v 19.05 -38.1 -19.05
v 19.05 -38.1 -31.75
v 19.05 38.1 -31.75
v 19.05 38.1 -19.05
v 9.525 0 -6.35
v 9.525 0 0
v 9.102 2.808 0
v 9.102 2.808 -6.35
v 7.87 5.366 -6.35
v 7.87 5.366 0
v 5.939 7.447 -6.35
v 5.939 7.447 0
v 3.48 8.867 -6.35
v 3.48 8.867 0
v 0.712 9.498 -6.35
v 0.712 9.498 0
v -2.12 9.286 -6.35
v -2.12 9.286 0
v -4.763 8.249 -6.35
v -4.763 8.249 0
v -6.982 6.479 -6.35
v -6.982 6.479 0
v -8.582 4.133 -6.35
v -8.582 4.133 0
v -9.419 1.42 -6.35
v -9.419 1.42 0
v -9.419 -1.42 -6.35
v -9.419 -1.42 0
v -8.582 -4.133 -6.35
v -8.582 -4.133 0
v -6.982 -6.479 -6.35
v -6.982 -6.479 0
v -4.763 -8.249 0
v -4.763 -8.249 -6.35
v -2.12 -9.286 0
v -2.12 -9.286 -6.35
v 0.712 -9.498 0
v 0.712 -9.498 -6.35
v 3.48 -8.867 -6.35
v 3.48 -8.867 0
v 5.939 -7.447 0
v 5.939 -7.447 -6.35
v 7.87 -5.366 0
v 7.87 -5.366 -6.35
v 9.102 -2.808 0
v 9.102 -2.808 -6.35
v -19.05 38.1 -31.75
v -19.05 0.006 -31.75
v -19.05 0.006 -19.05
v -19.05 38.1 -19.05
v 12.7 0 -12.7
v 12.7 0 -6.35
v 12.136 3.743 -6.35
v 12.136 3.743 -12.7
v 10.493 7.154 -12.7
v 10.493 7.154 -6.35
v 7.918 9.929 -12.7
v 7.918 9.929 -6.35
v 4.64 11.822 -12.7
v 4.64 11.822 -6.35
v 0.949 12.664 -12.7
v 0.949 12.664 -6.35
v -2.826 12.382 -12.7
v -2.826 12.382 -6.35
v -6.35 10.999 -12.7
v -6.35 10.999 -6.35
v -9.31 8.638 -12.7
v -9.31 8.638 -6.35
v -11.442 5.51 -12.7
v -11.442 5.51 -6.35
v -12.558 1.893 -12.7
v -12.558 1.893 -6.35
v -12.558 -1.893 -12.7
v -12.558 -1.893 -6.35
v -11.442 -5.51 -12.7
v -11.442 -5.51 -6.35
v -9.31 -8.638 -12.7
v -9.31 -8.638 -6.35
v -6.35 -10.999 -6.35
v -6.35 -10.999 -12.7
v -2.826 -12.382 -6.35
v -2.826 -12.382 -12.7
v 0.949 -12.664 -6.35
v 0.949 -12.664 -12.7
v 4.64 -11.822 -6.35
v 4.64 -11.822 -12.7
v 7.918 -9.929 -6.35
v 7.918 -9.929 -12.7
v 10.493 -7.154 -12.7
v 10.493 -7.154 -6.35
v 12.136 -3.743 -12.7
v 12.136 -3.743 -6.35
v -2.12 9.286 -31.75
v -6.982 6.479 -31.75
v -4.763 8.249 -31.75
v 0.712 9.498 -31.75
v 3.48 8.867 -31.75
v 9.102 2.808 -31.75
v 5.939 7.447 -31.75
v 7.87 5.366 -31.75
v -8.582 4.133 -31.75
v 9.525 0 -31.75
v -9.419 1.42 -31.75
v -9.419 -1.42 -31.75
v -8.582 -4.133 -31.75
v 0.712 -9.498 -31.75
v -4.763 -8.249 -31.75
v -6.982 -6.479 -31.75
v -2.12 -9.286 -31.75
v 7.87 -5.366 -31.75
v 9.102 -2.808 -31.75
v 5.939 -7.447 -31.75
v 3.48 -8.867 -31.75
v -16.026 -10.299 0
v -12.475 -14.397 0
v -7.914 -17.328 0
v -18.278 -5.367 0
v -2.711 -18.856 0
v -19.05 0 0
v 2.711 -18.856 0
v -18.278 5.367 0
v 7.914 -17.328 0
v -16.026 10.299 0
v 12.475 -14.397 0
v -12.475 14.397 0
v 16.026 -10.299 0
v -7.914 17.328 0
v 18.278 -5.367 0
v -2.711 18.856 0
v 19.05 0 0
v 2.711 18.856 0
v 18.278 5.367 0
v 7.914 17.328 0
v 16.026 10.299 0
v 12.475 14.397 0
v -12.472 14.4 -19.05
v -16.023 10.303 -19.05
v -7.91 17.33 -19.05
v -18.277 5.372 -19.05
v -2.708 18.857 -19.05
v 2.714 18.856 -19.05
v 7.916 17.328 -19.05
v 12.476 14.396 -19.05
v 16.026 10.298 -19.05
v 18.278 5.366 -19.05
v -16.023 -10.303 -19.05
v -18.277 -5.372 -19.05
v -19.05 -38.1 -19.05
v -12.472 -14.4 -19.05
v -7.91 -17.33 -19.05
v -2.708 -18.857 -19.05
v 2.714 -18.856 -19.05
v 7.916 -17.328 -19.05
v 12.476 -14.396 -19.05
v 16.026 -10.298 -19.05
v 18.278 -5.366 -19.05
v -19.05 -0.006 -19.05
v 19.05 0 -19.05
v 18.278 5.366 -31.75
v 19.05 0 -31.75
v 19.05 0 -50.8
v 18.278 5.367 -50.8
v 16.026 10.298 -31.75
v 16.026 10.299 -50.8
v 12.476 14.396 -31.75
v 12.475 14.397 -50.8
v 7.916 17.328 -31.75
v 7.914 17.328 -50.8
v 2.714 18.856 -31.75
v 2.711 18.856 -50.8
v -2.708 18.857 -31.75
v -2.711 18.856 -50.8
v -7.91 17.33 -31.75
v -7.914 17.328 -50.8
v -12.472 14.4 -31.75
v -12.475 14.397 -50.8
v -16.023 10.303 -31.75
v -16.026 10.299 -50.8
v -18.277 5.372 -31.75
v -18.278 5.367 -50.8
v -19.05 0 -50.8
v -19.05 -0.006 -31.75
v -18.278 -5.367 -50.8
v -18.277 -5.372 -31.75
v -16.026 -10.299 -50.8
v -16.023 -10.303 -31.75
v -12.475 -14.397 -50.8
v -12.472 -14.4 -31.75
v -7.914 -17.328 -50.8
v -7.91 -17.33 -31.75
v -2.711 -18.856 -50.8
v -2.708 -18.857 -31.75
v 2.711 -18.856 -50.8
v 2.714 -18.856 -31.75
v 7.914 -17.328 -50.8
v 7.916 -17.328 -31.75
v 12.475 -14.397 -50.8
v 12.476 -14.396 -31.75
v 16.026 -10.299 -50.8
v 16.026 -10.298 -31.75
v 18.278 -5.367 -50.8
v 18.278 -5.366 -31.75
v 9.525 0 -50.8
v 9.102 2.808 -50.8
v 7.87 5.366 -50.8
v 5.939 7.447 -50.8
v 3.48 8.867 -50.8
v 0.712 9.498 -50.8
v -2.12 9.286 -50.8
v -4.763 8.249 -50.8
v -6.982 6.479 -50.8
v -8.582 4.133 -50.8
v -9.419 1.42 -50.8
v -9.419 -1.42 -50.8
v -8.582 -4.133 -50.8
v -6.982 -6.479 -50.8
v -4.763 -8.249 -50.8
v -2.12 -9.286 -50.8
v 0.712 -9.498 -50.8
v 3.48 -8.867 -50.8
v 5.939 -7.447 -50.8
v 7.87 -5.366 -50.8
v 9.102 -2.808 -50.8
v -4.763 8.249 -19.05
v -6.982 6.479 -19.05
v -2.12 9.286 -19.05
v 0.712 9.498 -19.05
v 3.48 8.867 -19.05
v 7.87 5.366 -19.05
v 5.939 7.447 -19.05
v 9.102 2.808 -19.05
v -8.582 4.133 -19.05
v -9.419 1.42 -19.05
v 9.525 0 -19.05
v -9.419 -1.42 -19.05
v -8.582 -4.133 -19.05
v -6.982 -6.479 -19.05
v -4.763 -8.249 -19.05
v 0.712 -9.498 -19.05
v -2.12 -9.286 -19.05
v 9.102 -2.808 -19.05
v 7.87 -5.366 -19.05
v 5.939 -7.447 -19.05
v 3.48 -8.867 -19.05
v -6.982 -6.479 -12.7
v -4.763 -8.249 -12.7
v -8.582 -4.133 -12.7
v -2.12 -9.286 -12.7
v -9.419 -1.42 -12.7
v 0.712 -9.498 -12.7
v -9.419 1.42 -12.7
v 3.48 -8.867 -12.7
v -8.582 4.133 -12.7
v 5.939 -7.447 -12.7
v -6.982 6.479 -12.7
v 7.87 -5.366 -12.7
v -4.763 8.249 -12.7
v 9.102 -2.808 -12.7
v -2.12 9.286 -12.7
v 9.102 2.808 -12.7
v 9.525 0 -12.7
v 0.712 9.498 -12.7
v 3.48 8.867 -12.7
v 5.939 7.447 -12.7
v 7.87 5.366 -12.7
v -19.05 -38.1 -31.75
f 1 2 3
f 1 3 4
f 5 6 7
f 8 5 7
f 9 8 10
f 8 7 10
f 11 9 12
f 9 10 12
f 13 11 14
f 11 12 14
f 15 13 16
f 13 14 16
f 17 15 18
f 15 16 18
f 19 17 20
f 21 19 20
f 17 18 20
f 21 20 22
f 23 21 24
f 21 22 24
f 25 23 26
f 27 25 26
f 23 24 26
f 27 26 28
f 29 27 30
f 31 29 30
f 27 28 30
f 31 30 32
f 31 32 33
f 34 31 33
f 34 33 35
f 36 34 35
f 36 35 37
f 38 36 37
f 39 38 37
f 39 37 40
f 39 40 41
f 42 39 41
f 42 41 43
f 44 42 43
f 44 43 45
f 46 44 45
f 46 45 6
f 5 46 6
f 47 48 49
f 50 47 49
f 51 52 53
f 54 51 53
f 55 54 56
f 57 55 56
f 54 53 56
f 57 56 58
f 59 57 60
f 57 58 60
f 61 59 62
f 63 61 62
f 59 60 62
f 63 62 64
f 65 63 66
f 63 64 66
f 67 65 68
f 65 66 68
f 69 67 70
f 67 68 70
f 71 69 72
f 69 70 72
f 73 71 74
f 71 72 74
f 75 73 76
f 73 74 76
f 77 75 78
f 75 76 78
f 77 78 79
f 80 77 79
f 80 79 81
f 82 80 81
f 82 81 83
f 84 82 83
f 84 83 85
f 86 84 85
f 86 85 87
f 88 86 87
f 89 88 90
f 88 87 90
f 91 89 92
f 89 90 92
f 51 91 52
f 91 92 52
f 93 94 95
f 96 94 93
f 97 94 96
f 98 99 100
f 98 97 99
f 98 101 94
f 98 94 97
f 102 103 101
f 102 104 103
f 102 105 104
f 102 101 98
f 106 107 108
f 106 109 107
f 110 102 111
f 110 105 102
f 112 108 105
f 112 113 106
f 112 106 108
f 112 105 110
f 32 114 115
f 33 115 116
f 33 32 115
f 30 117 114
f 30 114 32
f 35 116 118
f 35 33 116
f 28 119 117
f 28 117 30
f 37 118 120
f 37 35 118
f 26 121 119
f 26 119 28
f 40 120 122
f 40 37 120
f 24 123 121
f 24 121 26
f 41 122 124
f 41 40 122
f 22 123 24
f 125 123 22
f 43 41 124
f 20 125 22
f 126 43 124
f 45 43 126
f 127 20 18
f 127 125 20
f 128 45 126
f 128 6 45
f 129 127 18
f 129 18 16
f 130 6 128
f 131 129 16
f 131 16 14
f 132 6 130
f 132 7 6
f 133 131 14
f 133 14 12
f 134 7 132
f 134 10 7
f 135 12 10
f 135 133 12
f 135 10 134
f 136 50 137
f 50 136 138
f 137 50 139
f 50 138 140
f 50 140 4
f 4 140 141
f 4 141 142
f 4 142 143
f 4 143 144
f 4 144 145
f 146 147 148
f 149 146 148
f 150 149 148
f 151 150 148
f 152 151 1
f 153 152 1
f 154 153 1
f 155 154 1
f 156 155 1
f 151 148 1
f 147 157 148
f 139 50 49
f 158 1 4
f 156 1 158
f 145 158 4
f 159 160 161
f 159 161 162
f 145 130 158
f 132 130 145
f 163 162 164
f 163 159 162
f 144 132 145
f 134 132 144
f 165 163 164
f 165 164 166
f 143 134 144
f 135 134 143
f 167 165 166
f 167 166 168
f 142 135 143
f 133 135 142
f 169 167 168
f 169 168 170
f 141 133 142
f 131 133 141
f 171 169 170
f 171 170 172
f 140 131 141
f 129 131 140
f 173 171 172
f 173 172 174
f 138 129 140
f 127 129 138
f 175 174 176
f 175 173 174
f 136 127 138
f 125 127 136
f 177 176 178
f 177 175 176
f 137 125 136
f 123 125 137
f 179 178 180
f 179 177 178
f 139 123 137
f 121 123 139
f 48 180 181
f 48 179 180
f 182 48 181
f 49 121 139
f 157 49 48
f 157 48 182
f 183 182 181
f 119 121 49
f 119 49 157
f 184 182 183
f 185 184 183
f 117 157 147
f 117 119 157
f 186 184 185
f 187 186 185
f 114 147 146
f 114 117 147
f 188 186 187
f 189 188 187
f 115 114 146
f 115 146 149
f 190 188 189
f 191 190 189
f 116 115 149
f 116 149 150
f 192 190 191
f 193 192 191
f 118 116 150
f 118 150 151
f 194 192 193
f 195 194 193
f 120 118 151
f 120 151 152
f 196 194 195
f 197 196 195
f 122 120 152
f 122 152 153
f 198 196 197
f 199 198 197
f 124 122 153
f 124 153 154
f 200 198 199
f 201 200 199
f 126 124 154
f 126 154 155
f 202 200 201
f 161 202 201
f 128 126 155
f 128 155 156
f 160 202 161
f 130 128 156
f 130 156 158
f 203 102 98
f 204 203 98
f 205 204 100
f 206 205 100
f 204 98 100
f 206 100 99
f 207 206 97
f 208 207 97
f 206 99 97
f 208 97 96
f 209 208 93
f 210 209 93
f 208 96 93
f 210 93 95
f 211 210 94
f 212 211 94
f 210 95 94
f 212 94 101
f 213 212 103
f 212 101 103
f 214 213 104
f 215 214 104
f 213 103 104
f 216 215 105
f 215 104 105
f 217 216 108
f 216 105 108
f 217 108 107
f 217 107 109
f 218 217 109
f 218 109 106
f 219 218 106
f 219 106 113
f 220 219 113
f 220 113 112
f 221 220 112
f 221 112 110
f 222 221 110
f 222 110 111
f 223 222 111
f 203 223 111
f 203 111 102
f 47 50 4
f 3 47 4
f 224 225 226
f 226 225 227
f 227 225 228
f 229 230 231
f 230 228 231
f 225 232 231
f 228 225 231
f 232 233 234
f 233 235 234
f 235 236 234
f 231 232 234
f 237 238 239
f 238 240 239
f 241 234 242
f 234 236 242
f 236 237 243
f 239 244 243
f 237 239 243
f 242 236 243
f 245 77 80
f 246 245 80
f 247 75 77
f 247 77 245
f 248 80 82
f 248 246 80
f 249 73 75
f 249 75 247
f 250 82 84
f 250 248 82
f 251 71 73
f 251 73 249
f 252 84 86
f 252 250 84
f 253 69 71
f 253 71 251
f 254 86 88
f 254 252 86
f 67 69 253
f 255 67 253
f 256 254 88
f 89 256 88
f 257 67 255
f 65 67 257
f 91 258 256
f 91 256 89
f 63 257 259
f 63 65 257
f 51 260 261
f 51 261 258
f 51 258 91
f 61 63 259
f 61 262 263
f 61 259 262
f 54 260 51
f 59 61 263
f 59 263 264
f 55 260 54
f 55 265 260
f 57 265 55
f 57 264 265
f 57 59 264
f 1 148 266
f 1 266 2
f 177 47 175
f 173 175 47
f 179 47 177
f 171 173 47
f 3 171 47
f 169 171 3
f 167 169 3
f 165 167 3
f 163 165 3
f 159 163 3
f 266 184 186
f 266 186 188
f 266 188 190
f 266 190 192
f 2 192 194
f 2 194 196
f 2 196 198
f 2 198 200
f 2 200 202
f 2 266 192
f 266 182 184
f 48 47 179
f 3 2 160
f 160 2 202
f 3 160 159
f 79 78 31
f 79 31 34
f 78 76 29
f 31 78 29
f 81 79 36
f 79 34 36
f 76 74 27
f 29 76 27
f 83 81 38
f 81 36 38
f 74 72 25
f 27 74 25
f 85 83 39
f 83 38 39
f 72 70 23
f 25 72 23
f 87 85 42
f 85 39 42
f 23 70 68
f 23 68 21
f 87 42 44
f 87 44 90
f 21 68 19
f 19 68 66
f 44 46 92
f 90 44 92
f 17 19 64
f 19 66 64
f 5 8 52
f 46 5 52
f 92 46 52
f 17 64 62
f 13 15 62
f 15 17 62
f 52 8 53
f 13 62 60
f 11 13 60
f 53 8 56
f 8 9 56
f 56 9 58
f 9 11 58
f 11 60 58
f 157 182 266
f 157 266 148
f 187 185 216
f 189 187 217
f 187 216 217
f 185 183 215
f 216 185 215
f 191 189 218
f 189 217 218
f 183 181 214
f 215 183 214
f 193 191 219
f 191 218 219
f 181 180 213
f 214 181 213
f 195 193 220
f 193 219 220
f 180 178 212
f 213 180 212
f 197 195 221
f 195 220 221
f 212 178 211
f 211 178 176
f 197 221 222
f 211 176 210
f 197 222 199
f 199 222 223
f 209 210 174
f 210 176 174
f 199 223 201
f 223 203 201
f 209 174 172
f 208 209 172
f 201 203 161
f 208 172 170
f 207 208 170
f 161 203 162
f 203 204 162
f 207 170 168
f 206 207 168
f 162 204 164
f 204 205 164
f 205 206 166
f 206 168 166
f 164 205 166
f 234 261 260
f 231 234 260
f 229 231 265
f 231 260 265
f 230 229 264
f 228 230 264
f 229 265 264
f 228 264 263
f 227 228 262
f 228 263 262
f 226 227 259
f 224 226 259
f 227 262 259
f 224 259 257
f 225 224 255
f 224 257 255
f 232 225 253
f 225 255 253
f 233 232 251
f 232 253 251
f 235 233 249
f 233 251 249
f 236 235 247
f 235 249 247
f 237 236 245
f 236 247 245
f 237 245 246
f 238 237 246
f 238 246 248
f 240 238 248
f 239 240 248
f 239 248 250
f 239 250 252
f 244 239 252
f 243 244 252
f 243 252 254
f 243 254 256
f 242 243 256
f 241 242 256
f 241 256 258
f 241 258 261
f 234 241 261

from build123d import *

# Parameters (mm, degrees)
F0_R     = 19.05
F0_R_2   = 9.525
F1_DEPTH = 50.8
F3_W     = 38.1
F3_H     = 12.7
F4_DEPTH = 76.2
F6_R     = 12.7
F7_DEPTH = 6.35


with BuildPart() as f1:
    # F0 (on Top) → F1 (new body)
    with BuildSketch(Plane.XY):
        Circle(F0_R)
        Circle(F0_R_2, mode=Mode.SUBTRACT)
    extrude(amount=-F1_DEPTH)

    # F3 (on offset) → F4 (join)
    with BuildSketch(Plane.XZ.offset(38.1)):
        with Locations((1e-06, -25.4)):
            Rectangle(F3_W, F3_H)
    extrude(amount=-F4_DEPTH)

    # F6 (on offset) → F7 (cut)
    with BuildSketch(Plane.XY.offset(-6.35)):
        Circle(F6_R)
    extrude(amount=-F7_DEPTH, mode=Mode.SUBTRACT)


solid = f1.part
